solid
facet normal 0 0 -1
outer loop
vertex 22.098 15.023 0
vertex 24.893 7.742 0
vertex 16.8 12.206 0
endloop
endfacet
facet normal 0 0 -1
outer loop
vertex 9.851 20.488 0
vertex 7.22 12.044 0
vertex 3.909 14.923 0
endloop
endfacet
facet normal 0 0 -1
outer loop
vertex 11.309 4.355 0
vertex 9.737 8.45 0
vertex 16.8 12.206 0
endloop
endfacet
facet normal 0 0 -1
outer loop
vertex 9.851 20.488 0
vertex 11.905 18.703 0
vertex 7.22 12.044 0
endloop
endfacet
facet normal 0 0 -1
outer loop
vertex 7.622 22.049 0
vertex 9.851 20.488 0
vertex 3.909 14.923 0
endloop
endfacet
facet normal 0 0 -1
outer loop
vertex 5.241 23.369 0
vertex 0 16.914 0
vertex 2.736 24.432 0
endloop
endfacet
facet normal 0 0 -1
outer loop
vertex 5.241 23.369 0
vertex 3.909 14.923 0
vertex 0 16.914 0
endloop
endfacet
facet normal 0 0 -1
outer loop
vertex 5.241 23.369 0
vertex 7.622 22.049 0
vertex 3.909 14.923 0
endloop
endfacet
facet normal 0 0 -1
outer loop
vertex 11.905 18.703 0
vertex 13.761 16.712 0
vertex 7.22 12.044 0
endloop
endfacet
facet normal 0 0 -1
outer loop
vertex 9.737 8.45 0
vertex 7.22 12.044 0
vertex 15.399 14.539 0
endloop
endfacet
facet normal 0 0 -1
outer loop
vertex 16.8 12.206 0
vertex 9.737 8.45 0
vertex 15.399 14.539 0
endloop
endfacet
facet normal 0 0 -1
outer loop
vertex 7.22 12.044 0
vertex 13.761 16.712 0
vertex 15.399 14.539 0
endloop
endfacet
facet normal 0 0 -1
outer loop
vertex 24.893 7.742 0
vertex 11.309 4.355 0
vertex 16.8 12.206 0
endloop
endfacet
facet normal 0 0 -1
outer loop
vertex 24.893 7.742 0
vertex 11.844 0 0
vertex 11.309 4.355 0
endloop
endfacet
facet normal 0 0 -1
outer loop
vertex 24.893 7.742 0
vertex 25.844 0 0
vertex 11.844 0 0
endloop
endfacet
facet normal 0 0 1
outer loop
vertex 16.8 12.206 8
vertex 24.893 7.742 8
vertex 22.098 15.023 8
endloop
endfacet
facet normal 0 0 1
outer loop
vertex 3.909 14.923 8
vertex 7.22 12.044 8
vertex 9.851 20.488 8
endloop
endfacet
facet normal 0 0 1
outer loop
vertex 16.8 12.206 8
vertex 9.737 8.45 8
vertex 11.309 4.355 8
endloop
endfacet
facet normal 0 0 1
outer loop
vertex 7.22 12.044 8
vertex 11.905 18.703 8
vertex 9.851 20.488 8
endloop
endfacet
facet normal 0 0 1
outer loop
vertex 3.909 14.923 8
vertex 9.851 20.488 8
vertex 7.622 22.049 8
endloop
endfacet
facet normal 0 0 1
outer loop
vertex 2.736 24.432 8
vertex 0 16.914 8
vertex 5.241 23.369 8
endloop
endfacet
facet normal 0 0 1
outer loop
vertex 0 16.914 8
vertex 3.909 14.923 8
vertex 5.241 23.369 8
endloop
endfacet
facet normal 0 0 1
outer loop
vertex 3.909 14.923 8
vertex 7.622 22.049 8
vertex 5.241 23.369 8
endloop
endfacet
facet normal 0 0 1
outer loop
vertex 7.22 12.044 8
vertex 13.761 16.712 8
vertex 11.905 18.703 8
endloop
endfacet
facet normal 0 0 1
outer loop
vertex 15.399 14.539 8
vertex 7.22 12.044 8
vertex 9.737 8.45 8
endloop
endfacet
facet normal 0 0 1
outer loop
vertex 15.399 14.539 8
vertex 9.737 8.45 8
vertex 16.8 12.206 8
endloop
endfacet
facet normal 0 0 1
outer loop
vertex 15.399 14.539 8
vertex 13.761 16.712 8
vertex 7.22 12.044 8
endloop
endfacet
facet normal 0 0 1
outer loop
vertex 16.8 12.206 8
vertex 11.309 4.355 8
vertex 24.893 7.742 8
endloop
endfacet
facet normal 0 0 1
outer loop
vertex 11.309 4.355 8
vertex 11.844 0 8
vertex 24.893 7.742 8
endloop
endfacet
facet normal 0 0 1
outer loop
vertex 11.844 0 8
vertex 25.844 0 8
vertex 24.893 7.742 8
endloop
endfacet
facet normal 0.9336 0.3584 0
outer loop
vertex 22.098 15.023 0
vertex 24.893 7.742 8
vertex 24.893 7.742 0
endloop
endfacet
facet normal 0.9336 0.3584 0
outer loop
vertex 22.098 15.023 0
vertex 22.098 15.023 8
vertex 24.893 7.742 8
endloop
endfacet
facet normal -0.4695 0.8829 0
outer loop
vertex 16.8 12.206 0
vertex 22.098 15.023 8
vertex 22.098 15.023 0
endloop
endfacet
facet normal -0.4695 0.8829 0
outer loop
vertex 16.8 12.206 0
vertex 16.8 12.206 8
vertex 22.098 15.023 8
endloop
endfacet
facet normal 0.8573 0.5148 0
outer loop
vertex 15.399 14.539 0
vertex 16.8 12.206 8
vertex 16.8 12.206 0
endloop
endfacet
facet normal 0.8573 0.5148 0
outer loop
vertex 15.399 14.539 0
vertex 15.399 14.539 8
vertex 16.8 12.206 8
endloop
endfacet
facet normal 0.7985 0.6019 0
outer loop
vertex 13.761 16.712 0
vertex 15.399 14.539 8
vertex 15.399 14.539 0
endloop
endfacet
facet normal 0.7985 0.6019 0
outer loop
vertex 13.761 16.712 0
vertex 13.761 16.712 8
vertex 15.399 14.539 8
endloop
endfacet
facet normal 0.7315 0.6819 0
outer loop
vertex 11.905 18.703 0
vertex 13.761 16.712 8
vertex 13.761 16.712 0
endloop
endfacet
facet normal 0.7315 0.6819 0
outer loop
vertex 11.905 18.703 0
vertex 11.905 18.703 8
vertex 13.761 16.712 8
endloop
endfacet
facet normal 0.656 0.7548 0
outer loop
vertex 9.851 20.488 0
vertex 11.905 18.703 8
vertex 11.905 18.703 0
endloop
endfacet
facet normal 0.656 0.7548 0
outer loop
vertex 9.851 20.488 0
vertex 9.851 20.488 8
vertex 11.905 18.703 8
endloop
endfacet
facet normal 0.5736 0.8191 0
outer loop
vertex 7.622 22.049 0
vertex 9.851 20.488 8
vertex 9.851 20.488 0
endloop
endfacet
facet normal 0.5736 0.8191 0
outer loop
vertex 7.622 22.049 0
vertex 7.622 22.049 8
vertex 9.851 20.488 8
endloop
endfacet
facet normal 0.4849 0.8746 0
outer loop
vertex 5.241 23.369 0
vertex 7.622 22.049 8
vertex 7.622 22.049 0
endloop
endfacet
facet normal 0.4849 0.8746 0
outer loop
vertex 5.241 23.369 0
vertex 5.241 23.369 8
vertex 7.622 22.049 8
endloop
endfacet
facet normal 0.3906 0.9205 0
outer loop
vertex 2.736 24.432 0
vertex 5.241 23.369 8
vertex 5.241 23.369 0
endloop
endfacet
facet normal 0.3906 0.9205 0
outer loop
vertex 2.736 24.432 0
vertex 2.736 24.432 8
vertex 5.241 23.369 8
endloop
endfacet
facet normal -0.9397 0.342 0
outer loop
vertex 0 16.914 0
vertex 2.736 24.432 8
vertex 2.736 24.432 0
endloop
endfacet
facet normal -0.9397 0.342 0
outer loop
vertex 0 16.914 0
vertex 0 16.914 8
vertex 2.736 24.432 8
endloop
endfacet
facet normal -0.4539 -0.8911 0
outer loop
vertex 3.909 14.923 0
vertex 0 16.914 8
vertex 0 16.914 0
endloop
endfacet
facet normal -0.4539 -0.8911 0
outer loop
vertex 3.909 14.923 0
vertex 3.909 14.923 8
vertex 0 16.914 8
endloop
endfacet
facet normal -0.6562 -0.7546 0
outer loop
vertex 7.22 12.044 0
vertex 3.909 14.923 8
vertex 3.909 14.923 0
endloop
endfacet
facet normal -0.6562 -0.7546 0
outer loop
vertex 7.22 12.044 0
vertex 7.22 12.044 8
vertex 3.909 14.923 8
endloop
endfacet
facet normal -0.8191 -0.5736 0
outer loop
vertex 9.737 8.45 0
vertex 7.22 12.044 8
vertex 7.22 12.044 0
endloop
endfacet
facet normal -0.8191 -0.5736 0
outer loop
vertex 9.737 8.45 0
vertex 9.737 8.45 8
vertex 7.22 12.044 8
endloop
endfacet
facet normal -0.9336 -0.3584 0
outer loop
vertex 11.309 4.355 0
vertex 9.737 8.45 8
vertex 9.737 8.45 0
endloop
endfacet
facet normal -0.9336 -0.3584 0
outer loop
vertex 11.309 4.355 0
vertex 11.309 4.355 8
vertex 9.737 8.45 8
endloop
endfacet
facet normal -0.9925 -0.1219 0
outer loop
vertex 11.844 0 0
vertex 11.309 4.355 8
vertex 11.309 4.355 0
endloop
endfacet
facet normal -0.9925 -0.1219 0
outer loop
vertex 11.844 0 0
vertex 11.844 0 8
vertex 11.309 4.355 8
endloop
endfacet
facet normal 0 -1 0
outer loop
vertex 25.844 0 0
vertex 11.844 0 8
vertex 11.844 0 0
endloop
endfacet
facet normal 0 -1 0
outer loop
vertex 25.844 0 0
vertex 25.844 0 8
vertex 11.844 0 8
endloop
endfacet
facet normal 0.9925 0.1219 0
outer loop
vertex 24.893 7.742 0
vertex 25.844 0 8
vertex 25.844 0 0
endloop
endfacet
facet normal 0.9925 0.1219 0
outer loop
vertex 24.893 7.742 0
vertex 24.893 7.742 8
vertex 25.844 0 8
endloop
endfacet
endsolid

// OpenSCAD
$fn = 32;

// ----------------------------------------------------------------------
// Arc stop: segment, 8 mm thick
// ----------------------------------------------------------------------

// --- parameters (mm) ---
profile_height = 8;       // extrusion height
profile_points = 17;      // points of the closed outline

profile = [[25.844, 0], [24.893, 7.742], [22.098, 15.023], [16.8, 12.206], [15.399, 14.539], [13.761, 16.712], [11.905, 18.703], [9.851, 20.488], [7.622, 22.049], [5.241, 23.369], [2.736, 24.432], [0, 16.914], [3.909, 14.923], [7.22, 12.044], [9.737, 8.45], [11.309, 4.355], [11.844, 0]];  // single closed polygon, 17 points, counter clockwise

// --- the one profile operation ---
linear_extrude(height = profile_height) polygon(points = profile);
